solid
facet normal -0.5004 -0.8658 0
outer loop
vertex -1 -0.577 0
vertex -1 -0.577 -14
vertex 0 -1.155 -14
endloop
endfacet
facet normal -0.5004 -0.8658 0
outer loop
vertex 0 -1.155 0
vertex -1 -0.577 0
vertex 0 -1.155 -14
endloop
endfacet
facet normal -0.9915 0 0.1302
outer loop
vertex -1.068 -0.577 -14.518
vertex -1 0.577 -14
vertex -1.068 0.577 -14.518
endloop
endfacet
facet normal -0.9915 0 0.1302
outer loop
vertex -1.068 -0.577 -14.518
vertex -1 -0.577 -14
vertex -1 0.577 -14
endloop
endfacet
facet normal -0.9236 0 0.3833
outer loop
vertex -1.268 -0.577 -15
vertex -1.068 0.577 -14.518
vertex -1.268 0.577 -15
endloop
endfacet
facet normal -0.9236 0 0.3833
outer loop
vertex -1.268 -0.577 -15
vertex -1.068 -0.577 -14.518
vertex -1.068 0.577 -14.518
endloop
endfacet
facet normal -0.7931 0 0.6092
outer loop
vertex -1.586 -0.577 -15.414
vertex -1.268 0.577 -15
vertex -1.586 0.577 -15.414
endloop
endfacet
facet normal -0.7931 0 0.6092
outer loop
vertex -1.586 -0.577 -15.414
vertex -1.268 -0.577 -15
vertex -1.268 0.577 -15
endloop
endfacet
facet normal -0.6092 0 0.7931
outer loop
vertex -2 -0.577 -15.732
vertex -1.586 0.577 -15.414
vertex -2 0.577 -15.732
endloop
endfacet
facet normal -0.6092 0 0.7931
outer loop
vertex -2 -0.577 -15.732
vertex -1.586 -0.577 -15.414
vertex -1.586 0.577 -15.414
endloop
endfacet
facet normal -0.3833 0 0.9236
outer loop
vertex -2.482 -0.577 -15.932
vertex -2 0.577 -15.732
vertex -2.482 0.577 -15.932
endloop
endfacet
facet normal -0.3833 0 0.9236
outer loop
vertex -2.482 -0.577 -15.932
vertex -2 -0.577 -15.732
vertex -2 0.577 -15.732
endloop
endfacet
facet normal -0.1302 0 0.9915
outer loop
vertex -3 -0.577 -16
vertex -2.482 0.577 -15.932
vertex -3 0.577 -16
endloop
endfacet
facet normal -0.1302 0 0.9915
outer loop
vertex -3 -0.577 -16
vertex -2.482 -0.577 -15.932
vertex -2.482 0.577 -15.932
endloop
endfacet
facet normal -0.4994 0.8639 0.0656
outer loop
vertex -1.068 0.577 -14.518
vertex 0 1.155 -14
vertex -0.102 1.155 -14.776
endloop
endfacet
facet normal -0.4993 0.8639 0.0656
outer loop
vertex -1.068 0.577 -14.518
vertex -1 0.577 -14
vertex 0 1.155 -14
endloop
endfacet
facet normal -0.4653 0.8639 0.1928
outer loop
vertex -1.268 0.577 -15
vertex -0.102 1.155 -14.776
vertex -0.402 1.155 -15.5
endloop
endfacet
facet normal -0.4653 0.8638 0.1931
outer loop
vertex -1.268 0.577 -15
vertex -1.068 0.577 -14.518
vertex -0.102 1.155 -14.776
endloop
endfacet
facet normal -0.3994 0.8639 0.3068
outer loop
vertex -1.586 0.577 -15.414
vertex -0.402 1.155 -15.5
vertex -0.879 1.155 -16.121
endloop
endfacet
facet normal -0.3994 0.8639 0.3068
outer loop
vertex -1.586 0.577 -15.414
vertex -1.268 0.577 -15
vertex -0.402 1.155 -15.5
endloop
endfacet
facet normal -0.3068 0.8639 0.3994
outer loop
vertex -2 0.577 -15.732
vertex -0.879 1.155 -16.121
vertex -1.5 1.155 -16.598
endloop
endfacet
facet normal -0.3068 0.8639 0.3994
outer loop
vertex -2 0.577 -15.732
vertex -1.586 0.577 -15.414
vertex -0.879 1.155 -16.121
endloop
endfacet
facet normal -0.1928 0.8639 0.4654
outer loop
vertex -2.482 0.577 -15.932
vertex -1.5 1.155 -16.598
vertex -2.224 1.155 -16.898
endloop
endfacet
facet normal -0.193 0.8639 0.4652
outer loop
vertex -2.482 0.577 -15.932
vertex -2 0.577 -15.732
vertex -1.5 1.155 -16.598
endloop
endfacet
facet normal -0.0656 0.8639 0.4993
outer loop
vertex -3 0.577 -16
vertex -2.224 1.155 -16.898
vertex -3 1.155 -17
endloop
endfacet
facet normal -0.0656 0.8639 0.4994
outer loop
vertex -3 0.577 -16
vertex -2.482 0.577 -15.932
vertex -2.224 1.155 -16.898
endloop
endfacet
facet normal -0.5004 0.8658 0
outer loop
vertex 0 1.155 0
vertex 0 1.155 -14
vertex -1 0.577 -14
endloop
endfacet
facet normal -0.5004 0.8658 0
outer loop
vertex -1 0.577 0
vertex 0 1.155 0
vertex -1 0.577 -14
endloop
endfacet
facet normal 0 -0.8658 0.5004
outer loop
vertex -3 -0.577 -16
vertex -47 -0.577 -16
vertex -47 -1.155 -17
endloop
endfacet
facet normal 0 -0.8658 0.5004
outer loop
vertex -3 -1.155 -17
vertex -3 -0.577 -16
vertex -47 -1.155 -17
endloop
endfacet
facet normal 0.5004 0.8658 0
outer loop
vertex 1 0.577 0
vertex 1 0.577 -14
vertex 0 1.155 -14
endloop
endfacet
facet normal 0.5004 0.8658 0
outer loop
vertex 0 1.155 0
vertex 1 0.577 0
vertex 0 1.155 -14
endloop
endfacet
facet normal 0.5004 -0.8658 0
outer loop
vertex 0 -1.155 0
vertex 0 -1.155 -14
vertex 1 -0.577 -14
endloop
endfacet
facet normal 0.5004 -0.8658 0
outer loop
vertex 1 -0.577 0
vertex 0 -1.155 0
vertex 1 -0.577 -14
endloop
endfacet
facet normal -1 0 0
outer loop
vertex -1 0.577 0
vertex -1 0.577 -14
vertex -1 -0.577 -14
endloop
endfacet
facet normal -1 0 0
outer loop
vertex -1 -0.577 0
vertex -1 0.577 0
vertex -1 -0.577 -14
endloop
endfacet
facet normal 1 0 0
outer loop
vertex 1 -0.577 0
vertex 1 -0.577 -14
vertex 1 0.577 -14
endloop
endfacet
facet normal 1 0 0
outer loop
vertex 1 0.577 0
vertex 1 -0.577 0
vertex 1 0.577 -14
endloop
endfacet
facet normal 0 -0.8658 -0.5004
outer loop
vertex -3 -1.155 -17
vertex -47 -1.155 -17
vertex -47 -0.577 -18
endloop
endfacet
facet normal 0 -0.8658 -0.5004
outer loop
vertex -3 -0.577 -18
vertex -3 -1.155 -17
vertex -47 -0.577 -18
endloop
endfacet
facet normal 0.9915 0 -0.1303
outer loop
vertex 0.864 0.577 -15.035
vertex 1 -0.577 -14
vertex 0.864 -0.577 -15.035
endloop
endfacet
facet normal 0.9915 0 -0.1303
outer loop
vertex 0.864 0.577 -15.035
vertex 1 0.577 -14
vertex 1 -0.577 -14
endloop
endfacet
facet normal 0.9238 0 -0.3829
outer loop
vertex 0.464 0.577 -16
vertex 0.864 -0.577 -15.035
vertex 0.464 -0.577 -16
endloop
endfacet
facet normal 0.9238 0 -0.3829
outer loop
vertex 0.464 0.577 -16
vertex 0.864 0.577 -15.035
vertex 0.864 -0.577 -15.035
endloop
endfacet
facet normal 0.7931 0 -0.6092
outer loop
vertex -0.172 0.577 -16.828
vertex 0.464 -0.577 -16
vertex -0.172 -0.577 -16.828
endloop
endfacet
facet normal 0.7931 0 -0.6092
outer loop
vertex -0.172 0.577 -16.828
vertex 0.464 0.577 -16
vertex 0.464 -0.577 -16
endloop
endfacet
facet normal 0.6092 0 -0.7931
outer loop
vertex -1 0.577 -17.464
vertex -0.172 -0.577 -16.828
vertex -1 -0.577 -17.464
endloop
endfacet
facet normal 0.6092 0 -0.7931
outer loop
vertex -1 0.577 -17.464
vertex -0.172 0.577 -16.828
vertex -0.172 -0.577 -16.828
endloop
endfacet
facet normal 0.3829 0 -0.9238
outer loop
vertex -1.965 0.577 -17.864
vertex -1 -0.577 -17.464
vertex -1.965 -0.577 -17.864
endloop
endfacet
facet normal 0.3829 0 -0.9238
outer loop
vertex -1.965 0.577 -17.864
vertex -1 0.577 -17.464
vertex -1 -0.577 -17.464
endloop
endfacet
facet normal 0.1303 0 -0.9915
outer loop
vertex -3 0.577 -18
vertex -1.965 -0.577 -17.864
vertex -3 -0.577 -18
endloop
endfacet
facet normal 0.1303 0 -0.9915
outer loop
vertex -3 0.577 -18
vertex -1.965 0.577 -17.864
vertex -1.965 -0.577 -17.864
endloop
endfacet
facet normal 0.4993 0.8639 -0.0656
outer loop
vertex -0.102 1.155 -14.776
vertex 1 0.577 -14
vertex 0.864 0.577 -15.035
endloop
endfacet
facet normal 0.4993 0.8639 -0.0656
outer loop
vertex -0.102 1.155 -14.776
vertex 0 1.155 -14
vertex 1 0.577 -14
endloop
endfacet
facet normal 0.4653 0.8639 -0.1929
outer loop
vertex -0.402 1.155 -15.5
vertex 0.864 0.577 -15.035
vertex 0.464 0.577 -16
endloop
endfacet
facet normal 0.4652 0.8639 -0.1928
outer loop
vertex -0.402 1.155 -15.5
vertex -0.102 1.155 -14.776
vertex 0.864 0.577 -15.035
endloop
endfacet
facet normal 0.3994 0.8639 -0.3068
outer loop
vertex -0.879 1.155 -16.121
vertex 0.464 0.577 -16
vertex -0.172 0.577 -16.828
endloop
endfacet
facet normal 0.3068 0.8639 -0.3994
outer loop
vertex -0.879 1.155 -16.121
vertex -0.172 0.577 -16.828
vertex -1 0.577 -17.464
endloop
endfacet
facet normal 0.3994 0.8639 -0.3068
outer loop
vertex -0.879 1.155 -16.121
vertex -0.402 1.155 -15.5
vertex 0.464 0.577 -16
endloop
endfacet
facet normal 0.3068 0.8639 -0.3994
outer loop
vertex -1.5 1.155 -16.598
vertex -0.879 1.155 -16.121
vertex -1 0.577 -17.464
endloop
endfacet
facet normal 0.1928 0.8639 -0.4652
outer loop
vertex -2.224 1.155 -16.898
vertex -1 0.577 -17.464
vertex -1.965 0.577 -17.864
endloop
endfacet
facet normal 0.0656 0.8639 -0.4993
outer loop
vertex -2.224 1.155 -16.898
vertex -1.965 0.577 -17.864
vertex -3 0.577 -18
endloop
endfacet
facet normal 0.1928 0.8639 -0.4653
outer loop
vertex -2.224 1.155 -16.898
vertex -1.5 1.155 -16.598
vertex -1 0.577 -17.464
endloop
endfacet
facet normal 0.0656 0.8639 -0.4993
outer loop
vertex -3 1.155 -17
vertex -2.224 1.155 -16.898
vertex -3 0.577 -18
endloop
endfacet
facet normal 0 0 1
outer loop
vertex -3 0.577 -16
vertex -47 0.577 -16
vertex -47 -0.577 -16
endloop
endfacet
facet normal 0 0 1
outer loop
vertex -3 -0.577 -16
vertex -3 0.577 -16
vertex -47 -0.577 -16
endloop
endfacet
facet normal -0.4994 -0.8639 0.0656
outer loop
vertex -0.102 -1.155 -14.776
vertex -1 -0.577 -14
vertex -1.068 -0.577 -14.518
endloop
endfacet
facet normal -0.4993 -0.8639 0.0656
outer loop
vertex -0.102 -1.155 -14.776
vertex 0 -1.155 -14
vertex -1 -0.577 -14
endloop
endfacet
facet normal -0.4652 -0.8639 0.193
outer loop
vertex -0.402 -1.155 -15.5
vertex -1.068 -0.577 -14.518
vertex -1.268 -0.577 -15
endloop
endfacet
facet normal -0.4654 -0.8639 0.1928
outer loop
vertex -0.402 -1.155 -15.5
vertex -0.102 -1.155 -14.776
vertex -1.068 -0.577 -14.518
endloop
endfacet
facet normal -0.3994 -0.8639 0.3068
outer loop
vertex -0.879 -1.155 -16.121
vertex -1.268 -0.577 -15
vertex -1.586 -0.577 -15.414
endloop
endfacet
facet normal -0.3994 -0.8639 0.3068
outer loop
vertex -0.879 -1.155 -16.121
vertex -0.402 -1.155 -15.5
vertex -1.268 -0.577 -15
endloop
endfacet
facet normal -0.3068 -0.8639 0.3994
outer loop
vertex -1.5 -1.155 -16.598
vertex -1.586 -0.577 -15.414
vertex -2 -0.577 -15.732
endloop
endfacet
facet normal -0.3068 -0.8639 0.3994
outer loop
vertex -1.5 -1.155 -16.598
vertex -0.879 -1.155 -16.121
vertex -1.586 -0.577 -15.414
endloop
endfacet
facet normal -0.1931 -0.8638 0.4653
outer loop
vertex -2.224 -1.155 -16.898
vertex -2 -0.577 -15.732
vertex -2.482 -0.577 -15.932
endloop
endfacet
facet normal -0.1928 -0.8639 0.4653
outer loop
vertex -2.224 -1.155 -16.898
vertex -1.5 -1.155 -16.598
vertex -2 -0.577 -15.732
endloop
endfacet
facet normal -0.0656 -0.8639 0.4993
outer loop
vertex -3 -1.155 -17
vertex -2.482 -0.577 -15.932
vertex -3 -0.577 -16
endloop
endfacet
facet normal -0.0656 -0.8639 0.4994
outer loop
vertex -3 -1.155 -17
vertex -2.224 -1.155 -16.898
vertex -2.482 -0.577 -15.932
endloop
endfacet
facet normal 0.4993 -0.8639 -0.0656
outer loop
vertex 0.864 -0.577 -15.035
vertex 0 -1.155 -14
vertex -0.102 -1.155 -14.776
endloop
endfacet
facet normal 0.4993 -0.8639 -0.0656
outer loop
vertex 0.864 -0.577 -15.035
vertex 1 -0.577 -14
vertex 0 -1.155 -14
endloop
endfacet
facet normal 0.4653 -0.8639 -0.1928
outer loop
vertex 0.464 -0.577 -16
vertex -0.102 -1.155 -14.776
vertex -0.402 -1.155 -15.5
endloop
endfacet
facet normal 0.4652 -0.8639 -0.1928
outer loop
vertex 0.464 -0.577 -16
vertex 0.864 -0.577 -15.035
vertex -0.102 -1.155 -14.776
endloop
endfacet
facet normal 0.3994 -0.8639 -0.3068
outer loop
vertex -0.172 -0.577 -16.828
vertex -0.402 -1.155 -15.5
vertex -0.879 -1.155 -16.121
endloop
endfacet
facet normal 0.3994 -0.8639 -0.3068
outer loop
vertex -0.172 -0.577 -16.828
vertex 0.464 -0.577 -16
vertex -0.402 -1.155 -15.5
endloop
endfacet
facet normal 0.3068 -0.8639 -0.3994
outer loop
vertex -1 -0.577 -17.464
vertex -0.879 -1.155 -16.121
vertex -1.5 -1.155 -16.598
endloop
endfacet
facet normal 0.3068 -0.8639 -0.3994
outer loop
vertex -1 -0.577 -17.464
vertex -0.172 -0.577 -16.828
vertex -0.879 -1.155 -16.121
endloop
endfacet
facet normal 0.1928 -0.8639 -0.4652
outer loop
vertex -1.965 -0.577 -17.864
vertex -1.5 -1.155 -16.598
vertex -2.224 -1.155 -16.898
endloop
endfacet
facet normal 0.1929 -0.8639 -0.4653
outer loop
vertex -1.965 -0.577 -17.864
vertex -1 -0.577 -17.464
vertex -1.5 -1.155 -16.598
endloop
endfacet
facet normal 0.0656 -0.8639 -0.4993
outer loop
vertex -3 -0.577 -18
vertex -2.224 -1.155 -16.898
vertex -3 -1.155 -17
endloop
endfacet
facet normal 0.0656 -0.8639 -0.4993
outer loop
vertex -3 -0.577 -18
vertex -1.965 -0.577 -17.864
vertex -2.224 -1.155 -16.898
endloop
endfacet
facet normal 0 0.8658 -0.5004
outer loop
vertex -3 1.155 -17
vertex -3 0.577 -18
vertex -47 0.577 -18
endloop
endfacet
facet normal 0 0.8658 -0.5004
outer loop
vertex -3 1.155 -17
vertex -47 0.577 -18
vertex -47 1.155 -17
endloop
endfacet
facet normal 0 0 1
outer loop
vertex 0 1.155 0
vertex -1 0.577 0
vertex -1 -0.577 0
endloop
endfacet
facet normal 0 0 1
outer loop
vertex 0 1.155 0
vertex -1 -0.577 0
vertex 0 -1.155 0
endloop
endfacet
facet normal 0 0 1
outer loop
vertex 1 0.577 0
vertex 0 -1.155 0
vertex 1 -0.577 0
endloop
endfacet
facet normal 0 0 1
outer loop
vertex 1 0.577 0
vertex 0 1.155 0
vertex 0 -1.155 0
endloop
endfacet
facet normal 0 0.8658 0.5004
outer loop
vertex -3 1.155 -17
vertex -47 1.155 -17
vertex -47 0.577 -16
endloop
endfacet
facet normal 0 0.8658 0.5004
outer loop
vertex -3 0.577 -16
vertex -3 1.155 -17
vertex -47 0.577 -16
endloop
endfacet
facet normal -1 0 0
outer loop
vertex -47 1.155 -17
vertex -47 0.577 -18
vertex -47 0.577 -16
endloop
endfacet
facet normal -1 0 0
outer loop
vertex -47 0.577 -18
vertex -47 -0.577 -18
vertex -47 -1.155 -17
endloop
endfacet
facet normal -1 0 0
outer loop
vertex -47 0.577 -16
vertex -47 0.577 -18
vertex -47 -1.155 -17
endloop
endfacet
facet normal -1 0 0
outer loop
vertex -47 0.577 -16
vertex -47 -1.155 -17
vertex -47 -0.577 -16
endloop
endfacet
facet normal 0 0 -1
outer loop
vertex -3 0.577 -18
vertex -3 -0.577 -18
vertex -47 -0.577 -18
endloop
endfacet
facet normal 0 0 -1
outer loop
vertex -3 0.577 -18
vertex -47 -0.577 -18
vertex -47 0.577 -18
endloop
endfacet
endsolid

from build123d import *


with BuildPart() as part:
    # Sweep1: sweep along a path in Sketch2
    with BuildLine(Plane(origin=(0, 0, 0), x_dir=(1, 0, 0), z_dir=(0, 1, 0))) as sweep1_path:
        Line((0, 0), (0, 14))
        ThreePointArc((0, 14), (-0.878679656, 16.121320344), (-3, 17))
        Line((-3, 17), (-47, 17))
    # Sketch1 → Sweep1 (sweep)
    with BuildSketch(Plane.XY):
        Polygon((0, 1.154700538), (-1, 0.577350269), (-1, -0.577350269), (0, -1.154700538), (1, -0.577350269), (1, 0.577350269), align=None)
    sweep(path=sweep1_path.line)


solid = part.part
